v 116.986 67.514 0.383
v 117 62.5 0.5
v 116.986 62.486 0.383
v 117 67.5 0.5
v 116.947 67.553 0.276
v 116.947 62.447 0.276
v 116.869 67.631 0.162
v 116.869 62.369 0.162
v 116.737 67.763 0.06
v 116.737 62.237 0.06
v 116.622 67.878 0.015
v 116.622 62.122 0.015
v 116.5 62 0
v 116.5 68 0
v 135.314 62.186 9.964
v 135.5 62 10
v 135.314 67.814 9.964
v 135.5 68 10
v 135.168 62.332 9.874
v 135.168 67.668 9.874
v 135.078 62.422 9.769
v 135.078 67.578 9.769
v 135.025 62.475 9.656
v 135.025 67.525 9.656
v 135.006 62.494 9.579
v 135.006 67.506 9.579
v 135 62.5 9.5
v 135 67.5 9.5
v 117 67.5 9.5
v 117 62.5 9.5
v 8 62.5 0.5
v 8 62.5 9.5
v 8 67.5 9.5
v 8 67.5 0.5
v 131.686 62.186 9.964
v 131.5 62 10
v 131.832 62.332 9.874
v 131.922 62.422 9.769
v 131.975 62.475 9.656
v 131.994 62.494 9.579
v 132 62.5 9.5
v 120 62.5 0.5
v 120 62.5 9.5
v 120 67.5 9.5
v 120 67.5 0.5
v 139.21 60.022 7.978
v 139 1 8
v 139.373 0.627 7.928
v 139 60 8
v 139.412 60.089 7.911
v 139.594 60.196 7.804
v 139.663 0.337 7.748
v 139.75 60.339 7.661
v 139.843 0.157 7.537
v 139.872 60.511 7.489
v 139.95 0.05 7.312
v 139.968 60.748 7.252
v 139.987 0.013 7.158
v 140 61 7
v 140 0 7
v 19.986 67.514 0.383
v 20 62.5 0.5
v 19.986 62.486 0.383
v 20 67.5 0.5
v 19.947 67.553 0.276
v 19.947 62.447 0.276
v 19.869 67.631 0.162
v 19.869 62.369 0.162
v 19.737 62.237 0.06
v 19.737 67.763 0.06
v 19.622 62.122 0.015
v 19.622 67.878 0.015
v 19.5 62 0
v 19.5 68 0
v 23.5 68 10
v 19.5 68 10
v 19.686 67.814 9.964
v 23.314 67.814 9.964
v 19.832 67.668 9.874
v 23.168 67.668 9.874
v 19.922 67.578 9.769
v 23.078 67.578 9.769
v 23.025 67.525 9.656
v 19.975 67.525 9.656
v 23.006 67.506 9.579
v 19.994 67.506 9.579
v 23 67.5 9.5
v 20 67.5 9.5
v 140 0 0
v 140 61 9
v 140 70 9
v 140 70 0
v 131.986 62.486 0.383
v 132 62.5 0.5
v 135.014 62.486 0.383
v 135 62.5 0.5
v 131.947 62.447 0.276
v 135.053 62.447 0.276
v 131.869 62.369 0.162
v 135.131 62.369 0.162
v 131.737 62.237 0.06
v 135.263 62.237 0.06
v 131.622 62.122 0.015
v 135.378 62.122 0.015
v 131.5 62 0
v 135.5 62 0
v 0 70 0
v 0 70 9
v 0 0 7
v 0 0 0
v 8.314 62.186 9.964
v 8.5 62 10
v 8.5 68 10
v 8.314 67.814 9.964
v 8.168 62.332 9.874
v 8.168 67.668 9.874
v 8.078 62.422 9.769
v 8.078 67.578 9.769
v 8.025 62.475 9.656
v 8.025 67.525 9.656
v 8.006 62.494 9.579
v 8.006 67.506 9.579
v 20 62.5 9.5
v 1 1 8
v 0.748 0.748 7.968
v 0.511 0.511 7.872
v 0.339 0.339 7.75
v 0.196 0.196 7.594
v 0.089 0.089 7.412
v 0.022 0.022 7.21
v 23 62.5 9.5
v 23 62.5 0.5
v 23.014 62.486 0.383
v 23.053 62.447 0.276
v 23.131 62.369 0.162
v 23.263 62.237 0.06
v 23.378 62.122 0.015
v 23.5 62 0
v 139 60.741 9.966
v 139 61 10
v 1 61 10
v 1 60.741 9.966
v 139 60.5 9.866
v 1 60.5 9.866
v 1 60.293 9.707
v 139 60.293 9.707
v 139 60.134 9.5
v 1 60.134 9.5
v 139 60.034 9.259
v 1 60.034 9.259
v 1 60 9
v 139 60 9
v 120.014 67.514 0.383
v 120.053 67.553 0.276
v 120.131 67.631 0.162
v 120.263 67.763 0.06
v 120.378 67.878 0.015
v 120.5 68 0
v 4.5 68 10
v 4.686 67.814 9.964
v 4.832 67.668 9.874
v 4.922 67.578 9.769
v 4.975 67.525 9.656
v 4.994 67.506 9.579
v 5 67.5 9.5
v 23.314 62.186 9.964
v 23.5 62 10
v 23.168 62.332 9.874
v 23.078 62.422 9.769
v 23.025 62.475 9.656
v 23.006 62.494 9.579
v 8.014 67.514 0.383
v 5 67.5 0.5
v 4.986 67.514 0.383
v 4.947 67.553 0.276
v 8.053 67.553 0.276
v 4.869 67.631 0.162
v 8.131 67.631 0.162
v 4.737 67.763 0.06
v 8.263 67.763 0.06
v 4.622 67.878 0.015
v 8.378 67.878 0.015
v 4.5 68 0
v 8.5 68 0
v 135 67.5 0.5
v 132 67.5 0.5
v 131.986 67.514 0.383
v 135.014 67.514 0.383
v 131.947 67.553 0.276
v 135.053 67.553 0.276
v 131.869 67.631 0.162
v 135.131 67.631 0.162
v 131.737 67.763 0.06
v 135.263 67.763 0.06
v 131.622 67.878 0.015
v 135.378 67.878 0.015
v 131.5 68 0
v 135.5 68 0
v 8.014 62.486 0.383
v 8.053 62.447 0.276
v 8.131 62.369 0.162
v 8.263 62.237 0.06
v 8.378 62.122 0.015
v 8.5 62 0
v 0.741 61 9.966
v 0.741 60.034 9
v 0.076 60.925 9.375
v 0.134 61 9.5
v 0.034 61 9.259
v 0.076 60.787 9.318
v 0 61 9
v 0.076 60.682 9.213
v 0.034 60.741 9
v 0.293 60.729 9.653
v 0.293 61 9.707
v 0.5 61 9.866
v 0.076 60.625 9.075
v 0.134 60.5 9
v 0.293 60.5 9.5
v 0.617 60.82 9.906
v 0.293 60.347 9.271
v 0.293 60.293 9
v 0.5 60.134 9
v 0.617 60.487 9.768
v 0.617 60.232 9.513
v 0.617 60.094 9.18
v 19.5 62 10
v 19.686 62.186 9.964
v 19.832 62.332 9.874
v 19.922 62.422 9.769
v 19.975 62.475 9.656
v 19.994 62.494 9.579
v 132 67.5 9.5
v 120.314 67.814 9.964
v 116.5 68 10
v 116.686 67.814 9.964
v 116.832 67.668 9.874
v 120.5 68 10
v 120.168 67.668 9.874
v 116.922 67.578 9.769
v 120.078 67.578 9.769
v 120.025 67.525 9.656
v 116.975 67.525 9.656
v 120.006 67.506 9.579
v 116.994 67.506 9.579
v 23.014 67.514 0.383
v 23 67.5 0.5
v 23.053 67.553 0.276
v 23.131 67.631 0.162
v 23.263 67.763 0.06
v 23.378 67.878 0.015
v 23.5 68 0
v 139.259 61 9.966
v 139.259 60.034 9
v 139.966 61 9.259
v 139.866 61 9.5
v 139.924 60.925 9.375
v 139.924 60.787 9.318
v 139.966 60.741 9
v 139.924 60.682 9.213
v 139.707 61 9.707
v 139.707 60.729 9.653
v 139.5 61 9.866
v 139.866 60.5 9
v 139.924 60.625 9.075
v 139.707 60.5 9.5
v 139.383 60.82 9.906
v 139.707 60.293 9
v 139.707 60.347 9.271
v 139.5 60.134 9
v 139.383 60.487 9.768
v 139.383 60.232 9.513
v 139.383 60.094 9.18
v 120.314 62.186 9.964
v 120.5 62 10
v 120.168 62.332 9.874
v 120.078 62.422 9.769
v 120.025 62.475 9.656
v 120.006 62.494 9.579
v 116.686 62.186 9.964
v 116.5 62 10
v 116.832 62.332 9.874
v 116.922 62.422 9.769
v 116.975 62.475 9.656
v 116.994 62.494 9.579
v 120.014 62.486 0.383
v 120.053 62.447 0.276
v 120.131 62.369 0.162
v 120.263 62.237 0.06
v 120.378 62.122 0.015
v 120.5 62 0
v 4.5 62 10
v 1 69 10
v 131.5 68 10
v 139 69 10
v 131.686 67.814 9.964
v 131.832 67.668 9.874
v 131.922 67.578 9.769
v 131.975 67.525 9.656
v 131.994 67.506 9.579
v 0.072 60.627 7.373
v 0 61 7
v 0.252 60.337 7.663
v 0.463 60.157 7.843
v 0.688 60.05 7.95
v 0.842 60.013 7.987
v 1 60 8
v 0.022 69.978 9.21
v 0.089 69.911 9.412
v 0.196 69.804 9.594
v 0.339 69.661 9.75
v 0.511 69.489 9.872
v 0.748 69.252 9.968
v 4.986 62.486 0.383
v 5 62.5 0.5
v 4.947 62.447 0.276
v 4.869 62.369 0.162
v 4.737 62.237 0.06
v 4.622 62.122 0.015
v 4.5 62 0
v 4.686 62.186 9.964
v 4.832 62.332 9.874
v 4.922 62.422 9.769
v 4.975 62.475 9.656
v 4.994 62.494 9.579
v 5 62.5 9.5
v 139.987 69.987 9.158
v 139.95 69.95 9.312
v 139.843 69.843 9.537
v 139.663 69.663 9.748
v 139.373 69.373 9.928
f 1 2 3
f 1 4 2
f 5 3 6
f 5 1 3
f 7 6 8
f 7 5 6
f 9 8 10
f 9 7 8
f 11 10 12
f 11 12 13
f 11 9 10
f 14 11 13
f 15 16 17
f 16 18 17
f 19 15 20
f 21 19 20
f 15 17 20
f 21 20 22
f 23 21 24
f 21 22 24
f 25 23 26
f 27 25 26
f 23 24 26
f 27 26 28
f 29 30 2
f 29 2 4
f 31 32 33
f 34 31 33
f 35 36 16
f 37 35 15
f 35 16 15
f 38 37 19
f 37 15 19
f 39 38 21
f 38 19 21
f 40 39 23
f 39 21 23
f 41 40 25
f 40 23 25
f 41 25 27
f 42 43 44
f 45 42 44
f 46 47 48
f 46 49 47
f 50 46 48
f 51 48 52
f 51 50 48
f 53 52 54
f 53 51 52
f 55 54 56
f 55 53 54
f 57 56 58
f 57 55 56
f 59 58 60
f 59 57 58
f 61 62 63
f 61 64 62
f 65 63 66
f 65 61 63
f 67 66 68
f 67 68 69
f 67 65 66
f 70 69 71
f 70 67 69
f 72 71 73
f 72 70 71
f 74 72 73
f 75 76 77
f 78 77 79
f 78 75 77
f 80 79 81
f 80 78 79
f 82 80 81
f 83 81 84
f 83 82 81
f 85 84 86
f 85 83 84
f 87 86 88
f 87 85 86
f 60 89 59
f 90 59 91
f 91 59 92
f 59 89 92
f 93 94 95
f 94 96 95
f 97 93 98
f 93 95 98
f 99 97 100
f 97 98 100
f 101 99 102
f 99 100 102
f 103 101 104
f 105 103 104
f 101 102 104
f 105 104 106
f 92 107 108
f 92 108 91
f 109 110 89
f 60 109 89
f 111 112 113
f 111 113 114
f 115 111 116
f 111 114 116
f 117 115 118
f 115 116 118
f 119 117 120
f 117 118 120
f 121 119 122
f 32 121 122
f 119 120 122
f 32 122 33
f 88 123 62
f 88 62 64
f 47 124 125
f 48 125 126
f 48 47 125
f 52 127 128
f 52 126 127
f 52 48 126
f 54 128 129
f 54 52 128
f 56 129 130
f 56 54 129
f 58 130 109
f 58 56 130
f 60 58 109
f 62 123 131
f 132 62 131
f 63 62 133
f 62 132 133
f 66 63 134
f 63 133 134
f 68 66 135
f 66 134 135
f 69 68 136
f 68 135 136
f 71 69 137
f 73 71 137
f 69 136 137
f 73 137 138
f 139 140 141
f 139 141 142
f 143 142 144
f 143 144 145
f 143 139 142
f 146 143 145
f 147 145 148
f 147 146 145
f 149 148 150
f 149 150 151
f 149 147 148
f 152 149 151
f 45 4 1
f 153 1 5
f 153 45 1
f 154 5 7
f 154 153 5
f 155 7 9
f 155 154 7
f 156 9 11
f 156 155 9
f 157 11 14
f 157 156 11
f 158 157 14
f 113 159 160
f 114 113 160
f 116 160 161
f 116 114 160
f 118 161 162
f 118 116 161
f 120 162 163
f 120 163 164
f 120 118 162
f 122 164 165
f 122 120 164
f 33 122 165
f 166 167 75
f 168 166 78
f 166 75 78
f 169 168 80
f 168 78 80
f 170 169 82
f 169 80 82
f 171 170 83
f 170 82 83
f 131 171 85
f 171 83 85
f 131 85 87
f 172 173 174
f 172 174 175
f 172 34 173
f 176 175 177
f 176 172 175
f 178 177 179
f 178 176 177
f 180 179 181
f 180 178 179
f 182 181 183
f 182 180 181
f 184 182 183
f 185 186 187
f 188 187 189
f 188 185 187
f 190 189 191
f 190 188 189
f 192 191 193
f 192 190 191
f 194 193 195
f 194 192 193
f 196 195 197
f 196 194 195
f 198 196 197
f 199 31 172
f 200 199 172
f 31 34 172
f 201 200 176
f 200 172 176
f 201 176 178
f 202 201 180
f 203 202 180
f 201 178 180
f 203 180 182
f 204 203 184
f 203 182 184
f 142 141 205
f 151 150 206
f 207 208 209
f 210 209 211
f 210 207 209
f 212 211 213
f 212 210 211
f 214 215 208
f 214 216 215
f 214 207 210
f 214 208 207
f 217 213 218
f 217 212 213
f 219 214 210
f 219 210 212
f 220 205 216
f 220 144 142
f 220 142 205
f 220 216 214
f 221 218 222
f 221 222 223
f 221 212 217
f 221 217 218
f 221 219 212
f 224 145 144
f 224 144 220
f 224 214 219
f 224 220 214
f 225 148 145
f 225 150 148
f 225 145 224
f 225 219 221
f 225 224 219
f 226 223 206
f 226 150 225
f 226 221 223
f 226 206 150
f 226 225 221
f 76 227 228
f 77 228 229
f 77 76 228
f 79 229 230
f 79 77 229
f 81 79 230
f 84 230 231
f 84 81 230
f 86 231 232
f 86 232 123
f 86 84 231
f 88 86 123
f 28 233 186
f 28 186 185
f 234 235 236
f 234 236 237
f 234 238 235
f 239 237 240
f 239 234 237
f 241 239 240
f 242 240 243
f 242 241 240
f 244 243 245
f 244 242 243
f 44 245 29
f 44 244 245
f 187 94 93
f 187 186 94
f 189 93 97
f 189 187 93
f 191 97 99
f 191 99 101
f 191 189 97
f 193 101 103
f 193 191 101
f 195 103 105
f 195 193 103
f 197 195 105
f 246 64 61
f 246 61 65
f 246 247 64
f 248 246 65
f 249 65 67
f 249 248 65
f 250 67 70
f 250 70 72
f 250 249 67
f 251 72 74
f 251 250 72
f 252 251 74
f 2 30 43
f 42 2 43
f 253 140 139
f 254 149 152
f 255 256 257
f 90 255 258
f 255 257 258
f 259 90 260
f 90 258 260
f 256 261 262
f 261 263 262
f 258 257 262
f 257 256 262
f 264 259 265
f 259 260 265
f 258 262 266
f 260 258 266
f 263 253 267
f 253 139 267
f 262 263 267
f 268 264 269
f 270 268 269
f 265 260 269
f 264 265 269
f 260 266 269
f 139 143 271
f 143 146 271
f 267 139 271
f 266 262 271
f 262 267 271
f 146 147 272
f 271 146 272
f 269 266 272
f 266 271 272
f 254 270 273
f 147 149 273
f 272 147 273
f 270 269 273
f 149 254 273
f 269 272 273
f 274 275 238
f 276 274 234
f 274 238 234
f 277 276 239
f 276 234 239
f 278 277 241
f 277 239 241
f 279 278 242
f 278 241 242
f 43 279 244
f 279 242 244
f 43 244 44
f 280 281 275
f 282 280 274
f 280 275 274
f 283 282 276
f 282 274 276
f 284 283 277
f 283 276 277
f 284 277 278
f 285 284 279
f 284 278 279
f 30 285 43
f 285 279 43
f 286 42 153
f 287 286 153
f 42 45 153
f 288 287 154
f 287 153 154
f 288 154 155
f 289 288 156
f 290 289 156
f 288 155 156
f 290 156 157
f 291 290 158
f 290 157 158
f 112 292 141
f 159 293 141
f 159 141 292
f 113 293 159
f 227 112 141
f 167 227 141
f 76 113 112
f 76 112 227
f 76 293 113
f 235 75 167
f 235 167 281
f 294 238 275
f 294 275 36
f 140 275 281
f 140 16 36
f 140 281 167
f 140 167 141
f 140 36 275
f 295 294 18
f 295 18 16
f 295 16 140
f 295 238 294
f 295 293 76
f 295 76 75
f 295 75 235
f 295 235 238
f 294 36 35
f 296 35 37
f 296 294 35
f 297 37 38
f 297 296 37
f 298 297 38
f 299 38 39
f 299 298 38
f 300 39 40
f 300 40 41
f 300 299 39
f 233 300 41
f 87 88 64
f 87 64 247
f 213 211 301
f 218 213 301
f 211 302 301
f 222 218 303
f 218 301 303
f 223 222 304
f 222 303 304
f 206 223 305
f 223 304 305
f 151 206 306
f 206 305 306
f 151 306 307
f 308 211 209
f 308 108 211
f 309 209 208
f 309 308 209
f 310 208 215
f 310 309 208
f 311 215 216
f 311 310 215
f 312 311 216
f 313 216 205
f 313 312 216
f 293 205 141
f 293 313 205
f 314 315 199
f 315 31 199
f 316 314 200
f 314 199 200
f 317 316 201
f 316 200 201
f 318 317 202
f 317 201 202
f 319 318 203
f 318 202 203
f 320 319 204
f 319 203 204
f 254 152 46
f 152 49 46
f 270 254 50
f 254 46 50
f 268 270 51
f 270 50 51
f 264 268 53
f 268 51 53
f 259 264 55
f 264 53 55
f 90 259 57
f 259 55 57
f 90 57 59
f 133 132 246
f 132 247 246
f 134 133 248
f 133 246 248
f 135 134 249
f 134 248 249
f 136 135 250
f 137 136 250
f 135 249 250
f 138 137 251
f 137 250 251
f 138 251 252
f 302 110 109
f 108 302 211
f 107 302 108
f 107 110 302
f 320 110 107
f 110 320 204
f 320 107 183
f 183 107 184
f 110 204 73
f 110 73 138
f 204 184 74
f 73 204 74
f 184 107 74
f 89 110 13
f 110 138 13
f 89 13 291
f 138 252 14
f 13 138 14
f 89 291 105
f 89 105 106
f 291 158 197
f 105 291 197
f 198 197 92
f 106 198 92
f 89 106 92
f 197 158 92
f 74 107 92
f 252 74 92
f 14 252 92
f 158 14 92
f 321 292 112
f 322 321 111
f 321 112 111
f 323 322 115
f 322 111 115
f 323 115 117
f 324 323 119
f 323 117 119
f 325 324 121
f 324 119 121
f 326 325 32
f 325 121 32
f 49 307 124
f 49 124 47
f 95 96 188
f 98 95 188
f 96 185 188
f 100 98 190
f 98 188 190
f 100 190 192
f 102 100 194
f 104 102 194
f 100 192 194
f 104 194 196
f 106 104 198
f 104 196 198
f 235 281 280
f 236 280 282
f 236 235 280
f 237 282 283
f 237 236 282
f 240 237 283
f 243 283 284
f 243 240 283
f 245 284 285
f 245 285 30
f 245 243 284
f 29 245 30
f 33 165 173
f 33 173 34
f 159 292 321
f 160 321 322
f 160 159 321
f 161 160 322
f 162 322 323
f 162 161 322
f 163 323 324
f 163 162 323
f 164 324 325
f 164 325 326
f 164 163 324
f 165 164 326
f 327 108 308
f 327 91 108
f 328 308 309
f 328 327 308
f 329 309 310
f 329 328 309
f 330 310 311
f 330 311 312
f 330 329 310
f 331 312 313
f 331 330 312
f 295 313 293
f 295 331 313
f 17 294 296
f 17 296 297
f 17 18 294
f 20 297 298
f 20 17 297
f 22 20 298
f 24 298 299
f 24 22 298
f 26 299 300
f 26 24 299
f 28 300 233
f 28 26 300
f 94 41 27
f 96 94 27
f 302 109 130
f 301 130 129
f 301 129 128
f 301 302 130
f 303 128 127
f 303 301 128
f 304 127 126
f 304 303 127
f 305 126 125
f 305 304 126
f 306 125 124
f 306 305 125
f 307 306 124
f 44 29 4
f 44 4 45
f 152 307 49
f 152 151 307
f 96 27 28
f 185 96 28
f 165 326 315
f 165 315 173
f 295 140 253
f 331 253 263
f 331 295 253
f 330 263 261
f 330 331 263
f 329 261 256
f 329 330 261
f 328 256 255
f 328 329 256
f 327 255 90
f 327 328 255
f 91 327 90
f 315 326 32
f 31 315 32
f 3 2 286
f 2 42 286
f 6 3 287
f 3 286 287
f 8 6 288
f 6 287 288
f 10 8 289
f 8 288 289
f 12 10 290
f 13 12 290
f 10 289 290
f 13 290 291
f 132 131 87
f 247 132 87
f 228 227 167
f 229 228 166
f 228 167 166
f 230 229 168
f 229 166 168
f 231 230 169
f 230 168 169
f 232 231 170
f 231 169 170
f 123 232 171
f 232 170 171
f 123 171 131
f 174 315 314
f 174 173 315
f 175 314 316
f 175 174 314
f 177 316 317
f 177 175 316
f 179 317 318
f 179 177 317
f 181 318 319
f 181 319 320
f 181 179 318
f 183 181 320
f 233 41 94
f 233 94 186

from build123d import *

# Parameters (mm, degrees)
SKETCH_W        = 140
SKETCH_H        = 70
PAD_DEPTH       = 10
SKETCH001_W     = 140
SKETCH001_H     = 60
POCKET_DEPTH    = 2
FILLET_R        = 1
SKETCH002_W     = 3
SKETCH002_H     = 5
POCKET001_DEPTH = 10.001
FILLET001_R     = 0.5
FILLET002_R     = 0.5


with BuildPart() as part:
    # Sketch → Pad (new body)
    with BuildSketch(Plane.XY):
        with Locations((70, 35)):
            Rectangle(SKETCH_W, SKETCH_H)
    extrude(amount=PAD_DEPTH)

    # Sketch001 (on Face6 of Pad) → Pocket (cut)
    with BuildSketch(Plane.XY.offset(10)):
        with Locations((70, 30)):
            Rectangle(SKETCH001_W, SKETCH001_H)
    extrude(amount=-POCKET_DEPTH, mode=Mode.SUBTRACT)

    # Fillet
    fillet_edges = [part.edges().sort_by_distance(p)[0] for p in [
        (0, 30, 8),
        (70, 0, 8),
        (140, 30, 8),
        (70, 60, 10),
        (140, 65, 10),
        (70, 70, 10),
        (0, 65, 10),
        (0, 60, 9),
        (140, 60, 9),
    ]]
    fillet(fillet_edges, radius=FILLET_R)

    # Sketch002 (on Face10 of Fillet) → Pocket001 (cut, through all)
    with BuildSketch(Plane.XY.offset(10)):
        with Locations((6.5, 65)):
            Rectangle(SKETCH002_W, SKETCH002_H)
        with Locations((21.5, 65)):
            Rectangle(SKETCH002_W, SKETCH002_H)
        with Locations((118.5, 65)):
            Rectangle(SKETCH002_W, SKETCH002_H)
        with Locations((133.5, 65)):
            Rectangle(SKETCH002_W, SKETCH002_H)
    extrude(amount=-POCKET001_DEPTH, mode=Mode.SUBTRACT)

    # Fillet001
    fillet001_edges = [part.edges().sort_by_distance(p)[0] for p in [
        (5, 65, 10),
        (6.5, 67.5, 10),
        (8, 65, 10),
        (6.5, 62.5, 10),
        (21.5, 67.5, 10),
        (20, 65, 10),
        (23, 65, 10),
        (21.5, 62.5, 10),
        (117, 65, 10),
        (118.5, 67.5, 10),
        (120, 65, 10),
        (118.5, 62.5, 10),
        (133.5, 67.5, 10),
        (132, 65, 10),
        (133.5, 62.5, 10),
        (135, 65, 10),
    ]]
    fillet(fillet001_edges, radius=FILLET001_R)

    # Fillet002
    fillet002_edges = [part.edges().sort_by_distance(p)[0] for p in [
        (5, 65, 0),
        (6.5, 62.5, 0),
        (8, 65, 0),
        (6.5, 67.5, 0),
        (21.5, 62.5, 0),
        (20, 65, 0),
        (21.5, 67.5, 0),
        (23, 65, 0),
        (117, 65, 0),
        (118.5, 62.5, 0),
        (120, 65, 0),
        (118.5, 67.5, 0),
        (132, 65, 0),
        (133.5, 62.5, 0),
        (135, 65, 0),
        (133.5, 67.5, 0),
    ]]
    fillet(fillet002_edges, radius=FILLET002_R)


solid = part.part
